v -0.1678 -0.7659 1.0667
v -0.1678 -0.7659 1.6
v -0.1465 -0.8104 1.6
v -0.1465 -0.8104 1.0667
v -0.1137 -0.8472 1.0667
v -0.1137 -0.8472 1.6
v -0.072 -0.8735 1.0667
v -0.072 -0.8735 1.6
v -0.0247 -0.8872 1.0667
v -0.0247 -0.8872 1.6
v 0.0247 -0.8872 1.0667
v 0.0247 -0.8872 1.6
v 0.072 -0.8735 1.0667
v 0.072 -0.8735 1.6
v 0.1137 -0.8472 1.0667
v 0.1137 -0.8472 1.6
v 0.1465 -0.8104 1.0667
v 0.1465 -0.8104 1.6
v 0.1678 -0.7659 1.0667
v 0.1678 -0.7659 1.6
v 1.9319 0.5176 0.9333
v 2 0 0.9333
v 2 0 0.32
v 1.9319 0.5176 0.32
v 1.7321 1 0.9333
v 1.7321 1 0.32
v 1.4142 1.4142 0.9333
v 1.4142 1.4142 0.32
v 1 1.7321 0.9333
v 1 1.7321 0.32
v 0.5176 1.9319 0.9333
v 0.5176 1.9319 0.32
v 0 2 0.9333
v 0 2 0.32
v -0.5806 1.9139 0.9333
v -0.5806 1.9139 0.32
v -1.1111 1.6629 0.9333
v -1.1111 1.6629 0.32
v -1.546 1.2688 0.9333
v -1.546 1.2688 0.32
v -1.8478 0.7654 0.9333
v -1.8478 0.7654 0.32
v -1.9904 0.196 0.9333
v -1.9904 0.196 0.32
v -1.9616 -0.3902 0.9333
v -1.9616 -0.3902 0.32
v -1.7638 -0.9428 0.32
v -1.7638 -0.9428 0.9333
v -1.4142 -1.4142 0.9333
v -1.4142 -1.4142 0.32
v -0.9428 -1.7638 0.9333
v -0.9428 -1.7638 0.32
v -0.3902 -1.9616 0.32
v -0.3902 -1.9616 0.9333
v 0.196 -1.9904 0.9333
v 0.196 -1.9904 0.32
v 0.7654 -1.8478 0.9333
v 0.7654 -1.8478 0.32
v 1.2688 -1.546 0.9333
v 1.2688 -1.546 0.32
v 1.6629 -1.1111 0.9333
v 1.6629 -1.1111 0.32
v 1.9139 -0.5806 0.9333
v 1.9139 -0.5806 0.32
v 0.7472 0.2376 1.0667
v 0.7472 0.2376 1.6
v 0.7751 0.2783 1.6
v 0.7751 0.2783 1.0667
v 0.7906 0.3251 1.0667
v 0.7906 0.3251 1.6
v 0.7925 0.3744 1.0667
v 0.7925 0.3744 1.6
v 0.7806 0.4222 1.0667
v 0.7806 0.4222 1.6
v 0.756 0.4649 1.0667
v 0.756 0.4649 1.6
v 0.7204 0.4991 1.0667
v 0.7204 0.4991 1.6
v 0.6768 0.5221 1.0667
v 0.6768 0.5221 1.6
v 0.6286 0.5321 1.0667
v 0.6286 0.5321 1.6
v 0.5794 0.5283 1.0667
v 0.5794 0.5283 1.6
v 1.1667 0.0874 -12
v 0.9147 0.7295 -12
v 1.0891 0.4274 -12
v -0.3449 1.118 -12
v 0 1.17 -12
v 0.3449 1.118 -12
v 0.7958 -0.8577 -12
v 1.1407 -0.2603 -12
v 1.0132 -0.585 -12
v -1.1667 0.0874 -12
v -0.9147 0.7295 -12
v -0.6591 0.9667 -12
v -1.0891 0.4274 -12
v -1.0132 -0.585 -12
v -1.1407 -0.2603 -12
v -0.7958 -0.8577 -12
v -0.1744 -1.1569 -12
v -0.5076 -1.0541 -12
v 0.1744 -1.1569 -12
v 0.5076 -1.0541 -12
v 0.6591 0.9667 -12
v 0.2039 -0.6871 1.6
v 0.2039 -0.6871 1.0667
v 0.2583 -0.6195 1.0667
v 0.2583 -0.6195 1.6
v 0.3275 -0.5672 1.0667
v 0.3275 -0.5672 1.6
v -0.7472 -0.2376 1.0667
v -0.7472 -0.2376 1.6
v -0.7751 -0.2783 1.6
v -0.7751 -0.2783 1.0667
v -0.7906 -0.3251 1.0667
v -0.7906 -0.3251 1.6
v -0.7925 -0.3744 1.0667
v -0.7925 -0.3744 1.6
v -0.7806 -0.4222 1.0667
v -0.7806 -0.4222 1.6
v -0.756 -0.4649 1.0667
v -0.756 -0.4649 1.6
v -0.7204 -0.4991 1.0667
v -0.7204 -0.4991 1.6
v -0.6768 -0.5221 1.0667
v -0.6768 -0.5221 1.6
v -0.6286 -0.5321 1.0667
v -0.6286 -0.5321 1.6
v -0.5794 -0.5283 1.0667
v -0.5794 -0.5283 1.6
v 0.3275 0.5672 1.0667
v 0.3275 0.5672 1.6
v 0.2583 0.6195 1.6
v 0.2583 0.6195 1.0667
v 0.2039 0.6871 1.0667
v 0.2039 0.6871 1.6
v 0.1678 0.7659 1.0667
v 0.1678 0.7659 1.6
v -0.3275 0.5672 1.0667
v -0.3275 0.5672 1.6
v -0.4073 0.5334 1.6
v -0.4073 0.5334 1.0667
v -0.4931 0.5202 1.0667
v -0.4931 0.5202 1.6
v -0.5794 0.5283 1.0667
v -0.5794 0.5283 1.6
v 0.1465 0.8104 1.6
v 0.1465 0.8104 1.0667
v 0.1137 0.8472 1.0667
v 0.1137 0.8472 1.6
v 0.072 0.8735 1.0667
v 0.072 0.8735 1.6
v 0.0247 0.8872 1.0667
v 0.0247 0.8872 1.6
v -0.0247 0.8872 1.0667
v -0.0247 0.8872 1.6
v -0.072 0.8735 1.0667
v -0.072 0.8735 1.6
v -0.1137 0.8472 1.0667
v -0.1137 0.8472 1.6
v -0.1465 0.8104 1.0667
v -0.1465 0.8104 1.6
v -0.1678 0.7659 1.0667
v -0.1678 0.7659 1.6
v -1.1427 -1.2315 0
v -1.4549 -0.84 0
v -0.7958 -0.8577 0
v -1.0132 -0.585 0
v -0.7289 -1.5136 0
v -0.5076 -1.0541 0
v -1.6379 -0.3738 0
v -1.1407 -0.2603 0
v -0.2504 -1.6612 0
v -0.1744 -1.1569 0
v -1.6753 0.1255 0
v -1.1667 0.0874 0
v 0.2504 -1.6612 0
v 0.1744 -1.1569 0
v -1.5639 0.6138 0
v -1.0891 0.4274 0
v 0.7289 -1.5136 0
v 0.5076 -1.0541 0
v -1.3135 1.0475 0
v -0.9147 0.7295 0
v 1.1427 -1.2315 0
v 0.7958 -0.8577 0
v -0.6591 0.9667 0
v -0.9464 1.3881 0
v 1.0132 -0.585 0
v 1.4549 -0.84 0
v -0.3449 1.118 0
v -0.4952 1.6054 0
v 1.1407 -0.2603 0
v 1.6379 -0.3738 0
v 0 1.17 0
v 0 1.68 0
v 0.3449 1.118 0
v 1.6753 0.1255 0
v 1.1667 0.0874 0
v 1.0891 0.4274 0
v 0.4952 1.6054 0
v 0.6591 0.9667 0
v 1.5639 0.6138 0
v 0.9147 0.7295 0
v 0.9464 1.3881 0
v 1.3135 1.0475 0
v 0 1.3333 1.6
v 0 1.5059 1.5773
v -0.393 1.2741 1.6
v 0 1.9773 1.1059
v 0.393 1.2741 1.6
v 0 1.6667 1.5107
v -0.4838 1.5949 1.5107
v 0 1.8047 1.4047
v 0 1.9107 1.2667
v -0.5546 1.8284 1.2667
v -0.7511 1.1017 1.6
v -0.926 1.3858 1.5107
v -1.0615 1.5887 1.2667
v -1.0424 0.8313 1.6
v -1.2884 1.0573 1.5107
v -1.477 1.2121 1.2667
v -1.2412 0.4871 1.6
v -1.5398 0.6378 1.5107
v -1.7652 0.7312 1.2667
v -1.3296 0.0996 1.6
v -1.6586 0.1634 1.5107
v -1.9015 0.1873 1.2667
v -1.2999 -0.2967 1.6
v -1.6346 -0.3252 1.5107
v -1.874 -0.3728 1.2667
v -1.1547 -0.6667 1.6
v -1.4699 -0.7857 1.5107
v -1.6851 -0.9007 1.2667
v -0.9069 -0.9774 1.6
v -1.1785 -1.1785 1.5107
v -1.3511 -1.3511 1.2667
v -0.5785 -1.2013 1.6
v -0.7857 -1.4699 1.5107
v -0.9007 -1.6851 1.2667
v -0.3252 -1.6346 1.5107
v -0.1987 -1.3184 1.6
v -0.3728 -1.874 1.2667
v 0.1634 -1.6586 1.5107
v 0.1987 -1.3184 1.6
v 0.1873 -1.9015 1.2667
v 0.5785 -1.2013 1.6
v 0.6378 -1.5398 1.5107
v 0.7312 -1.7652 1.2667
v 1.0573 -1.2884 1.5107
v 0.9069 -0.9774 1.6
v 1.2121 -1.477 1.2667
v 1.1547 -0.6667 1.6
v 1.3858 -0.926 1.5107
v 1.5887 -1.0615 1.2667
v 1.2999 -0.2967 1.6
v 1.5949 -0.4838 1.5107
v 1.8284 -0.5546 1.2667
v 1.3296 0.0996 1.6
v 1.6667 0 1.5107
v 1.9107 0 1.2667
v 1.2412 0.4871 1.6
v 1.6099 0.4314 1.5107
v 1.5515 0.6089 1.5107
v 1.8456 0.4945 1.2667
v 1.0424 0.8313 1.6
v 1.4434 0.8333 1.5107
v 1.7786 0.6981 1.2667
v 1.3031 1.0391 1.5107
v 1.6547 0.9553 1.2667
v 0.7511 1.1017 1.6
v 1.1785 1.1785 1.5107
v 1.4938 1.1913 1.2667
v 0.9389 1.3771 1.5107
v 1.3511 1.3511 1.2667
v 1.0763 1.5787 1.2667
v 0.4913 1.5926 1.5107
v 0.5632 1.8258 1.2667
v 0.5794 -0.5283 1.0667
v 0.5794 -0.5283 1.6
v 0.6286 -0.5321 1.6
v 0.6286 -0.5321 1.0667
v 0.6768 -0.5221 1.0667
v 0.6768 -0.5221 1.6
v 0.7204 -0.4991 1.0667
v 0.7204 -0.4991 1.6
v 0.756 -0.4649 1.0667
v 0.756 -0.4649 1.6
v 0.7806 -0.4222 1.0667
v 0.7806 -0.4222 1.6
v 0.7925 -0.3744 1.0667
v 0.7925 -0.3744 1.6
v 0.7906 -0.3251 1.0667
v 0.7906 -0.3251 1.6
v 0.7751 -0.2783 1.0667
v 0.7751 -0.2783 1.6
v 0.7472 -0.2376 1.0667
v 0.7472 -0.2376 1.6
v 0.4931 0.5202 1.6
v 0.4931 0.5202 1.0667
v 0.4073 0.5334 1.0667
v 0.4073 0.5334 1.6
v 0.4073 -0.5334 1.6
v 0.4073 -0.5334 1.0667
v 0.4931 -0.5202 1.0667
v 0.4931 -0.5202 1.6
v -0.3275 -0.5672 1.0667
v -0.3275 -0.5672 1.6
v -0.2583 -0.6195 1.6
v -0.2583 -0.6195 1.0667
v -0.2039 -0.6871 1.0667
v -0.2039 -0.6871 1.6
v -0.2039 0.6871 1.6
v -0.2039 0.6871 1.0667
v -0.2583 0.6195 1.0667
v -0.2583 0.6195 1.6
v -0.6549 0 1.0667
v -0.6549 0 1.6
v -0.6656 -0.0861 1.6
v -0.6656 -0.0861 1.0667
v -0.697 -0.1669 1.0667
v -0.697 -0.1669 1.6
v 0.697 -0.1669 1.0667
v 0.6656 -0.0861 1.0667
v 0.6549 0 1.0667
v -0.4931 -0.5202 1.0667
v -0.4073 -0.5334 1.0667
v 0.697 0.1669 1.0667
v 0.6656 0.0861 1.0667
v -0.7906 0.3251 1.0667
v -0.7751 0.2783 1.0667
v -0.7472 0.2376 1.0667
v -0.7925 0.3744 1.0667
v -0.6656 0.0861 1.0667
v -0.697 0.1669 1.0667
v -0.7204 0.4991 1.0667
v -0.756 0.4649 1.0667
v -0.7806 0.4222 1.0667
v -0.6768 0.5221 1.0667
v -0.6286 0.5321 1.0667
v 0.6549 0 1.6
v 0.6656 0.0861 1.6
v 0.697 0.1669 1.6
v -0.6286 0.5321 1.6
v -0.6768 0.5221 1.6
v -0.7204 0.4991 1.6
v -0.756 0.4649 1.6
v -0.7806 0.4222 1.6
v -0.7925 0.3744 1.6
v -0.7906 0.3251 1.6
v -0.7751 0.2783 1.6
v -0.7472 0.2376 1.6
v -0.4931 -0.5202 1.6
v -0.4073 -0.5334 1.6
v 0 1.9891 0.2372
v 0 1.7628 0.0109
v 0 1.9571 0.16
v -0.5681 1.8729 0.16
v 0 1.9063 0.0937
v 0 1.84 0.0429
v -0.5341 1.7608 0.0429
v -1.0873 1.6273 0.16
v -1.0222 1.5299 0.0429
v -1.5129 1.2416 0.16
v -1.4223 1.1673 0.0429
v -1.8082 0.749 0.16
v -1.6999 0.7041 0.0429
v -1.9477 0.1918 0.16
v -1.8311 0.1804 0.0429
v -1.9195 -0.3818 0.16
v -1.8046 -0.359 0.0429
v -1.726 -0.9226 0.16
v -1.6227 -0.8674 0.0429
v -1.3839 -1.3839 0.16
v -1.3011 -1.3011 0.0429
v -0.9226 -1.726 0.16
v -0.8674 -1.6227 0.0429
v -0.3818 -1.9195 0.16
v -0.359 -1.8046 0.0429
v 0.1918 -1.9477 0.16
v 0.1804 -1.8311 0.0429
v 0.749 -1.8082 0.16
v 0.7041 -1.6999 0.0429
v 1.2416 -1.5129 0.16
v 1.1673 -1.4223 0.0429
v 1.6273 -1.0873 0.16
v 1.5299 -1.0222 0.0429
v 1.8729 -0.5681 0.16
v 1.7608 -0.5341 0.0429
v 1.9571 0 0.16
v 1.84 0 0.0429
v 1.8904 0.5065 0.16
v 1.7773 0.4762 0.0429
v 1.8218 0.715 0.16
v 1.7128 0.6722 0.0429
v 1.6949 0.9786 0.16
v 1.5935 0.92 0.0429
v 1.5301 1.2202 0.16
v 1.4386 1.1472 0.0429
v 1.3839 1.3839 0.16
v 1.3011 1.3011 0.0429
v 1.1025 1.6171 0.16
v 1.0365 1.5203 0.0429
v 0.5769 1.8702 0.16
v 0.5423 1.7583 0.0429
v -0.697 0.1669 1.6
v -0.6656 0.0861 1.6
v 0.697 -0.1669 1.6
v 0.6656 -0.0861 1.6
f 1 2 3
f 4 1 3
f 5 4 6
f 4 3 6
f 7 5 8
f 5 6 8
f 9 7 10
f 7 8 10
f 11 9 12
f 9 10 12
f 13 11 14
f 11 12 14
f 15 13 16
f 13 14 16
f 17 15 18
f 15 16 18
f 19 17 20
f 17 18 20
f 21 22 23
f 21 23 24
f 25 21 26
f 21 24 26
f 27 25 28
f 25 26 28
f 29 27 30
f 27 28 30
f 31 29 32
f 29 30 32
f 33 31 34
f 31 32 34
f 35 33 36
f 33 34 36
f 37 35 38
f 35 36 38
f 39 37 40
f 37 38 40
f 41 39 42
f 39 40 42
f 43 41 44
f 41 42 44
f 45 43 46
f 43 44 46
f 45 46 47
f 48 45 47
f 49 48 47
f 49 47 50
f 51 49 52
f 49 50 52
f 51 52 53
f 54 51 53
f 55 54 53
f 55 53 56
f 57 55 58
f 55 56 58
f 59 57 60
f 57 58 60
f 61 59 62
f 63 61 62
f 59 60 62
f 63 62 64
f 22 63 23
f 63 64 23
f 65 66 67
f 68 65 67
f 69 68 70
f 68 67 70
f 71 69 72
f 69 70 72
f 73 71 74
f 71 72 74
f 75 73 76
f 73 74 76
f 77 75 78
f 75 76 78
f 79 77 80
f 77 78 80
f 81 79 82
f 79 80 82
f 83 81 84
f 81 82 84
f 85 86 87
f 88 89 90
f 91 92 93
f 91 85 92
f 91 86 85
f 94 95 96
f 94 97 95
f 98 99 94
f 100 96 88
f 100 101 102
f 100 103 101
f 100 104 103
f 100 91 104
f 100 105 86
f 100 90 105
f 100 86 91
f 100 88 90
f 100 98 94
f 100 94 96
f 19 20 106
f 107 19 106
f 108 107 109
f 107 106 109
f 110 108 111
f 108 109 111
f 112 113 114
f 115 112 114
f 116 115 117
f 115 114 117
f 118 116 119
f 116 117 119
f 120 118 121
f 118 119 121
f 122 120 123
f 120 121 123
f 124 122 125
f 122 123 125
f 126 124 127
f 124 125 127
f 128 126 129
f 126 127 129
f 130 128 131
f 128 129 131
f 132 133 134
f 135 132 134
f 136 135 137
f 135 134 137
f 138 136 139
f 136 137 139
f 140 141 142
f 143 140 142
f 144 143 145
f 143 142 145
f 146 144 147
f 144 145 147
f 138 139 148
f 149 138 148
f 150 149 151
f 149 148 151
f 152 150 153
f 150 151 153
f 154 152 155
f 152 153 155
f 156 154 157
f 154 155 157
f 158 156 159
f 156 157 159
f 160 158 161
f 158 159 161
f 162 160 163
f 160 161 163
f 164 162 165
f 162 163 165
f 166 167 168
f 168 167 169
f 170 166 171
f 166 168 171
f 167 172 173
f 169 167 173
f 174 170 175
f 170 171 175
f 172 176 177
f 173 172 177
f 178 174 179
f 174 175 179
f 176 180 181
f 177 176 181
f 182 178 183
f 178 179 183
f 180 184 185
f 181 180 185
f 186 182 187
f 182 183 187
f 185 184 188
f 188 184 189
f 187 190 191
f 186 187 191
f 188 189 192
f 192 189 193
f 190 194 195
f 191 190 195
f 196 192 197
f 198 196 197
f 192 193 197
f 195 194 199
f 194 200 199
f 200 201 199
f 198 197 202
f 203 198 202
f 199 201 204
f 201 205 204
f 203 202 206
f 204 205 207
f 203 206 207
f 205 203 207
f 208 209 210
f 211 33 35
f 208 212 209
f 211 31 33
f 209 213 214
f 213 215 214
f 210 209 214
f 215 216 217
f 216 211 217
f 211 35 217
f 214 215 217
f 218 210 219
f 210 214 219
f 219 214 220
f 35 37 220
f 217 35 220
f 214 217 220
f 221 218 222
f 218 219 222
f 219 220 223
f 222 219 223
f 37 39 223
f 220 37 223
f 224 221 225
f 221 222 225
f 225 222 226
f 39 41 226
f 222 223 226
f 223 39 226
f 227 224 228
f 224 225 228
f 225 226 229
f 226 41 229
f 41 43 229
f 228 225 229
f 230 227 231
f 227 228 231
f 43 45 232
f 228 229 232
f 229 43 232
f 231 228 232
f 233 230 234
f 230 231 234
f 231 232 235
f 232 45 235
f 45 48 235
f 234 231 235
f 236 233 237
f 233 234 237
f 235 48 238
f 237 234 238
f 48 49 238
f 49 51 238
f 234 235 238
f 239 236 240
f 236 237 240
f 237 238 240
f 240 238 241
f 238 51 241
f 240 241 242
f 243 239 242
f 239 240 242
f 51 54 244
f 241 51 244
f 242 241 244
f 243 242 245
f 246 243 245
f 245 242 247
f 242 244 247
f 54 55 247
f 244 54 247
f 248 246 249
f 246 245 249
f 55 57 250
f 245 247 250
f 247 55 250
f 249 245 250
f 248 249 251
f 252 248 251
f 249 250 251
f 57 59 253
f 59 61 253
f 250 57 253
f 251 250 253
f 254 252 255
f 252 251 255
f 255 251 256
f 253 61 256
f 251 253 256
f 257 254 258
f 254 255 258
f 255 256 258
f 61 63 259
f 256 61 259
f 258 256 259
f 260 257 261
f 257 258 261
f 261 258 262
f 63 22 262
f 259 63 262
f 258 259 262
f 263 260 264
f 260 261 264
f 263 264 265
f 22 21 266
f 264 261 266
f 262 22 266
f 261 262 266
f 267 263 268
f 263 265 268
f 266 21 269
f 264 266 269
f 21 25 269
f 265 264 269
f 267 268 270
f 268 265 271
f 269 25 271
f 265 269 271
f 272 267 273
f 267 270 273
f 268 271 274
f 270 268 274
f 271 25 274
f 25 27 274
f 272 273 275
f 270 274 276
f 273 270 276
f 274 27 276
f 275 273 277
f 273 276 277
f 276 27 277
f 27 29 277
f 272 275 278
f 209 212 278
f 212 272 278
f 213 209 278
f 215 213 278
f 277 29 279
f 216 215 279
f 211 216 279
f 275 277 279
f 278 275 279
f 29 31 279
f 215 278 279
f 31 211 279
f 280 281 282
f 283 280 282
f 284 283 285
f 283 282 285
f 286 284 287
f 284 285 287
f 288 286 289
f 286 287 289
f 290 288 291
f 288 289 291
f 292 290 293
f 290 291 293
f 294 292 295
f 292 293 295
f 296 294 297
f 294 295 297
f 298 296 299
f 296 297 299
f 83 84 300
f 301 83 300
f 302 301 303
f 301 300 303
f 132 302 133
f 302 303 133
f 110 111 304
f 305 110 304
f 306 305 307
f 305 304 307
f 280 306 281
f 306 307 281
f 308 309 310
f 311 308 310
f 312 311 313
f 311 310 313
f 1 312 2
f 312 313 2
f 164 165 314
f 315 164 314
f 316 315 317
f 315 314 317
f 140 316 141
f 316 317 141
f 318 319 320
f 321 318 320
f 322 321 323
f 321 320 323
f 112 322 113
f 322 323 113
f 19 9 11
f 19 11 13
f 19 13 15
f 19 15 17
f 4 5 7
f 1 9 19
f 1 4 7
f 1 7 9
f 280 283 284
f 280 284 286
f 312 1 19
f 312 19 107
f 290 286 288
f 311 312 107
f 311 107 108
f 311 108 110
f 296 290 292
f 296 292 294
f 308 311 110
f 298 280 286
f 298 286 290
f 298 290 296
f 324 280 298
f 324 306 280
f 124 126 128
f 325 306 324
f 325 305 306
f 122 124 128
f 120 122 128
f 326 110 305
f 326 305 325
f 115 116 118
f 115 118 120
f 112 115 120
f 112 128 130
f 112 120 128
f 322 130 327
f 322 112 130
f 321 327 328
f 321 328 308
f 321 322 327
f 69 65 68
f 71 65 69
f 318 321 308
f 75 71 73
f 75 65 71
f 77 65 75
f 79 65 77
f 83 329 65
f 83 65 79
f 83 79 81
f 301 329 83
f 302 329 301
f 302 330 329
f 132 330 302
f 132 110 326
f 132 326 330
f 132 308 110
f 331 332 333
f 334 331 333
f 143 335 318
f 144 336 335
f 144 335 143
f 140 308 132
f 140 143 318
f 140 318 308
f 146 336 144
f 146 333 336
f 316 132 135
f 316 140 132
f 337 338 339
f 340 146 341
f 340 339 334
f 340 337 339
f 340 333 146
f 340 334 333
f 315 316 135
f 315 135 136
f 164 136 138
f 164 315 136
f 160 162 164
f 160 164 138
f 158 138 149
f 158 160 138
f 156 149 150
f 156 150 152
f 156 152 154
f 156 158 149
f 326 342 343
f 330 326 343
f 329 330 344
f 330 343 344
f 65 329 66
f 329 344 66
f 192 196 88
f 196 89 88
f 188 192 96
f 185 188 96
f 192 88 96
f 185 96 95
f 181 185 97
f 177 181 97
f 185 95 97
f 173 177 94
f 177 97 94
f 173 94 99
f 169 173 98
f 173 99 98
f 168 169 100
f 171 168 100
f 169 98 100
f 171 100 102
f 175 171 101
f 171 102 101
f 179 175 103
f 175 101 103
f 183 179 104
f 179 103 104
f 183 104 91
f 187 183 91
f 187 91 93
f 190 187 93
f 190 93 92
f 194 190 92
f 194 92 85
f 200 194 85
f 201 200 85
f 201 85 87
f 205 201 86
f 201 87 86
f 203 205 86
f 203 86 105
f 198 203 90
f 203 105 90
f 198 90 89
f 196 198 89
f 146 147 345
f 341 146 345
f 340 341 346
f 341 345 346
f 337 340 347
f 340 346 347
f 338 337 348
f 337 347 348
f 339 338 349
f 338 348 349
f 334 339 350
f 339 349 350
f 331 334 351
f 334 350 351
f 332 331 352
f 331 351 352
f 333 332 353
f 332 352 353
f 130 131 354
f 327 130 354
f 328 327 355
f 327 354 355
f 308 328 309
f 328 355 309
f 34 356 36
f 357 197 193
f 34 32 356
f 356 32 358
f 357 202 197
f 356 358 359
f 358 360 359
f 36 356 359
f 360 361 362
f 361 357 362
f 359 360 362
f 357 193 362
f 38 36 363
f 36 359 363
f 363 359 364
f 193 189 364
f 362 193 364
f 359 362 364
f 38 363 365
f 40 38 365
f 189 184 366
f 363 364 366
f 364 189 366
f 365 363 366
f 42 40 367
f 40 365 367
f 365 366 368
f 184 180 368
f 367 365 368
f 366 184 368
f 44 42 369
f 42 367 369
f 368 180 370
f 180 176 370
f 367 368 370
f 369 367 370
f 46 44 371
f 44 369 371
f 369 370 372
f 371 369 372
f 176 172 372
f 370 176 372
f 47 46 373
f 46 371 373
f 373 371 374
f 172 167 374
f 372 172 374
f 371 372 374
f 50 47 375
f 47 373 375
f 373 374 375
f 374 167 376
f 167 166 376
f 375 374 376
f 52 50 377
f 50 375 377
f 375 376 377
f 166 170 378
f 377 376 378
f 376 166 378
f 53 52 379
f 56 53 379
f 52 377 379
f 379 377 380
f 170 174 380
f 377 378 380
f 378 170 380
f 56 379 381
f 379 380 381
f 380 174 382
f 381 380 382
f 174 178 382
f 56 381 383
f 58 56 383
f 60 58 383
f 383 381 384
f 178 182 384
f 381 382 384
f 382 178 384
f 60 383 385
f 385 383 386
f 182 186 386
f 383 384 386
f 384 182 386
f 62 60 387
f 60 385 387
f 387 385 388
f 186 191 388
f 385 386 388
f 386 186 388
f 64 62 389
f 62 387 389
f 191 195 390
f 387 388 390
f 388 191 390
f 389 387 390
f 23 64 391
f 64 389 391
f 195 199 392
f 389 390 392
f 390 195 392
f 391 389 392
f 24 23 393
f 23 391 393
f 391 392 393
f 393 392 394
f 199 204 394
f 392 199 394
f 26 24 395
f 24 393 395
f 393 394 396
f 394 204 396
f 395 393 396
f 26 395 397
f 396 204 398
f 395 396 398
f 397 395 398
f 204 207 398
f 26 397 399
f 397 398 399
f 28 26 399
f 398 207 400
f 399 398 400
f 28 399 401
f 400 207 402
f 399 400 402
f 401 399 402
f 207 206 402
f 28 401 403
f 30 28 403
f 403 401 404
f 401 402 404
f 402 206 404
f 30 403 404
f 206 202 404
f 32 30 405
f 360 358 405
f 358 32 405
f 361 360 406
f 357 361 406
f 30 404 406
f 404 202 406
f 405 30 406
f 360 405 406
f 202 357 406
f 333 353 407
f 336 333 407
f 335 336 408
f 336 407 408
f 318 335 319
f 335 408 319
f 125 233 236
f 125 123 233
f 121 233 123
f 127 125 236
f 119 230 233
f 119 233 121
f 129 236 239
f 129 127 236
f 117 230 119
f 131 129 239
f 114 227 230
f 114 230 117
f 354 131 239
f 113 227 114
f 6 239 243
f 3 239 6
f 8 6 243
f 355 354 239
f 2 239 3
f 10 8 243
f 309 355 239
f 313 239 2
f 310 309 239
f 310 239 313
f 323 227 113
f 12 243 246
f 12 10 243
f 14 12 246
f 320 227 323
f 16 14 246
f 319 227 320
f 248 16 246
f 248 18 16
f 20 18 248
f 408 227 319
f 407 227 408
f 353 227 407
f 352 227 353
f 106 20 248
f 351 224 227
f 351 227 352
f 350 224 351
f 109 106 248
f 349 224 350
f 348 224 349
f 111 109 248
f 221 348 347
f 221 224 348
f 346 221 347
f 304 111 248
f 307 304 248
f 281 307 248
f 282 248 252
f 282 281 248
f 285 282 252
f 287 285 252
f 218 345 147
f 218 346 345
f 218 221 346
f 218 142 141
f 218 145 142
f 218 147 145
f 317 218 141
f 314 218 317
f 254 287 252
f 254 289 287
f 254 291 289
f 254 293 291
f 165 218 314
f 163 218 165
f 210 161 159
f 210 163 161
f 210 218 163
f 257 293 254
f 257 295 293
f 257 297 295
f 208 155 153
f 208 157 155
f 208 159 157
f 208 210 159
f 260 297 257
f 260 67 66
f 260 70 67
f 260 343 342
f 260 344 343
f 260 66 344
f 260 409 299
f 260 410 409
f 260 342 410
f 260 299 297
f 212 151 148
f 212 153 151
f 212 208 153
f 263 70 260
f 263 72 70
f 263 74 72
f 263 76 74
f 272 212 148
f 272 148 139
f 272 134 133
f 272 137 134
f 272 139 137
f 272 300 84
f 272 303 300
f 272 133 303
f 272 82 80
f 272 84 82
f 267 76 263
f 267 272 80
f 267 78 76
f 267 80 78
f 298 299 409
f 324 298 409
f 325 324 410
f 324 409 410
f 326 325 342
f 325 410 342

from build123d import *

# Parameters (mm, degrees)
SKETCH17_W         = 12
SKETCH17_H         = 1.17
SKETCH1_R          = 2
EXTRUDE3_DEPTH     = 1.6
CUT_EXTRUDE1_DEPTH = 0.533333333
CIRPATTERN1_COUNT  = 6


with BuildPart() as part:
    # Sketch17 → Revolve1 (revolve)
    with BuildSketch(Plane(origin=(0, 0, 0), x_dir=(0, 0, -1), z_dir=(1, 0, 0))):
        with Locations((6, 0.585)):
            Rectangle(SKETCH17_W, SKETCH17_H)
    revolve(axis=Axis((0, 0, 0), (0, 0, 1)))

    # Sketch1 → Extrude3 (add)
    with BuildSketch(Plane.XY):
        Circle(SKETCH1_R)
    extrude(amount=EXTRUDE3_DEPTH)

    # Sketch11 → Cut-Revolve3 (revolve, cut)
    with BuildSketch(Plane(origin=(0, 0, 0), x_dir=(0, 0, -1), z_dir=(1, 0, 0))):
        with BuildLine():
            Line((-0.933333333, 2), (-0.32, 2))
            ThreePointArc((-0.32, 2), (-0.09372583, 1.90627417), (0, 1.68))
            Line((0, 1.68), (0.254, 1.68))
            Line((0.254, 1.68), (0.254, 2.254))
            Line((0.254, 2.254), (-1.854, 2.254))
            Line((-1.854, 2.254), (-1.854, 1.333333333))
            Line((-1.854, 1.333333333), (-1.6, 1.333333333))
            ThreePointArc((-1.6, 1.333333333), (-1.404737854, 1.804737854), (-0.933333333, 2))
        make_face()
    revolve(axis=Axis((0, 0, 0), (0, 0, 1)), mode=Mode.SUBTRACT)

    # Sketch12 → Cut-Extrude1 (cut)
    with BuildSketch(Plane.XY.offset(1.6)):
        with BuildLine():
            Line((-0.327453492, 0.567166085), (0, 0))
            Line((0, 0), (0.327453492, 0.567166085))
            ThreePointArc((0.327453492, 0.567166085), (0.229009756, 0.651587798), (0.167817831, 0.765928268))
            ThreePointArc((0.167817831, 0.765928268), (0, 0.888888889), (-0.167817831, 0.765928268))
            ThreePointArc((-0.167817831, 0.765928268), (-0.229009756, 0.651587798), (-0.327453492, 0.567166085))
        make_face()
    cut_extrude1 = extrude(amount=-CUT_EXTRUDE1_DEPTH, mode=Mode.SUBTRACT)

    # CirPattern1: Cut-Extrude1 ×6 about axis
    cirpattern1_axis = Axis((0, 0, 0), (0, 0, -1))
    for i in range(1, CIRPATTERN1_COUNT):
        add(cut_extrude1.rotate(cirpattern1_axis, i * 360 / CIRPATTERN1_COUNT), mode=Mode.SUBTRACT)


solid = part.part
